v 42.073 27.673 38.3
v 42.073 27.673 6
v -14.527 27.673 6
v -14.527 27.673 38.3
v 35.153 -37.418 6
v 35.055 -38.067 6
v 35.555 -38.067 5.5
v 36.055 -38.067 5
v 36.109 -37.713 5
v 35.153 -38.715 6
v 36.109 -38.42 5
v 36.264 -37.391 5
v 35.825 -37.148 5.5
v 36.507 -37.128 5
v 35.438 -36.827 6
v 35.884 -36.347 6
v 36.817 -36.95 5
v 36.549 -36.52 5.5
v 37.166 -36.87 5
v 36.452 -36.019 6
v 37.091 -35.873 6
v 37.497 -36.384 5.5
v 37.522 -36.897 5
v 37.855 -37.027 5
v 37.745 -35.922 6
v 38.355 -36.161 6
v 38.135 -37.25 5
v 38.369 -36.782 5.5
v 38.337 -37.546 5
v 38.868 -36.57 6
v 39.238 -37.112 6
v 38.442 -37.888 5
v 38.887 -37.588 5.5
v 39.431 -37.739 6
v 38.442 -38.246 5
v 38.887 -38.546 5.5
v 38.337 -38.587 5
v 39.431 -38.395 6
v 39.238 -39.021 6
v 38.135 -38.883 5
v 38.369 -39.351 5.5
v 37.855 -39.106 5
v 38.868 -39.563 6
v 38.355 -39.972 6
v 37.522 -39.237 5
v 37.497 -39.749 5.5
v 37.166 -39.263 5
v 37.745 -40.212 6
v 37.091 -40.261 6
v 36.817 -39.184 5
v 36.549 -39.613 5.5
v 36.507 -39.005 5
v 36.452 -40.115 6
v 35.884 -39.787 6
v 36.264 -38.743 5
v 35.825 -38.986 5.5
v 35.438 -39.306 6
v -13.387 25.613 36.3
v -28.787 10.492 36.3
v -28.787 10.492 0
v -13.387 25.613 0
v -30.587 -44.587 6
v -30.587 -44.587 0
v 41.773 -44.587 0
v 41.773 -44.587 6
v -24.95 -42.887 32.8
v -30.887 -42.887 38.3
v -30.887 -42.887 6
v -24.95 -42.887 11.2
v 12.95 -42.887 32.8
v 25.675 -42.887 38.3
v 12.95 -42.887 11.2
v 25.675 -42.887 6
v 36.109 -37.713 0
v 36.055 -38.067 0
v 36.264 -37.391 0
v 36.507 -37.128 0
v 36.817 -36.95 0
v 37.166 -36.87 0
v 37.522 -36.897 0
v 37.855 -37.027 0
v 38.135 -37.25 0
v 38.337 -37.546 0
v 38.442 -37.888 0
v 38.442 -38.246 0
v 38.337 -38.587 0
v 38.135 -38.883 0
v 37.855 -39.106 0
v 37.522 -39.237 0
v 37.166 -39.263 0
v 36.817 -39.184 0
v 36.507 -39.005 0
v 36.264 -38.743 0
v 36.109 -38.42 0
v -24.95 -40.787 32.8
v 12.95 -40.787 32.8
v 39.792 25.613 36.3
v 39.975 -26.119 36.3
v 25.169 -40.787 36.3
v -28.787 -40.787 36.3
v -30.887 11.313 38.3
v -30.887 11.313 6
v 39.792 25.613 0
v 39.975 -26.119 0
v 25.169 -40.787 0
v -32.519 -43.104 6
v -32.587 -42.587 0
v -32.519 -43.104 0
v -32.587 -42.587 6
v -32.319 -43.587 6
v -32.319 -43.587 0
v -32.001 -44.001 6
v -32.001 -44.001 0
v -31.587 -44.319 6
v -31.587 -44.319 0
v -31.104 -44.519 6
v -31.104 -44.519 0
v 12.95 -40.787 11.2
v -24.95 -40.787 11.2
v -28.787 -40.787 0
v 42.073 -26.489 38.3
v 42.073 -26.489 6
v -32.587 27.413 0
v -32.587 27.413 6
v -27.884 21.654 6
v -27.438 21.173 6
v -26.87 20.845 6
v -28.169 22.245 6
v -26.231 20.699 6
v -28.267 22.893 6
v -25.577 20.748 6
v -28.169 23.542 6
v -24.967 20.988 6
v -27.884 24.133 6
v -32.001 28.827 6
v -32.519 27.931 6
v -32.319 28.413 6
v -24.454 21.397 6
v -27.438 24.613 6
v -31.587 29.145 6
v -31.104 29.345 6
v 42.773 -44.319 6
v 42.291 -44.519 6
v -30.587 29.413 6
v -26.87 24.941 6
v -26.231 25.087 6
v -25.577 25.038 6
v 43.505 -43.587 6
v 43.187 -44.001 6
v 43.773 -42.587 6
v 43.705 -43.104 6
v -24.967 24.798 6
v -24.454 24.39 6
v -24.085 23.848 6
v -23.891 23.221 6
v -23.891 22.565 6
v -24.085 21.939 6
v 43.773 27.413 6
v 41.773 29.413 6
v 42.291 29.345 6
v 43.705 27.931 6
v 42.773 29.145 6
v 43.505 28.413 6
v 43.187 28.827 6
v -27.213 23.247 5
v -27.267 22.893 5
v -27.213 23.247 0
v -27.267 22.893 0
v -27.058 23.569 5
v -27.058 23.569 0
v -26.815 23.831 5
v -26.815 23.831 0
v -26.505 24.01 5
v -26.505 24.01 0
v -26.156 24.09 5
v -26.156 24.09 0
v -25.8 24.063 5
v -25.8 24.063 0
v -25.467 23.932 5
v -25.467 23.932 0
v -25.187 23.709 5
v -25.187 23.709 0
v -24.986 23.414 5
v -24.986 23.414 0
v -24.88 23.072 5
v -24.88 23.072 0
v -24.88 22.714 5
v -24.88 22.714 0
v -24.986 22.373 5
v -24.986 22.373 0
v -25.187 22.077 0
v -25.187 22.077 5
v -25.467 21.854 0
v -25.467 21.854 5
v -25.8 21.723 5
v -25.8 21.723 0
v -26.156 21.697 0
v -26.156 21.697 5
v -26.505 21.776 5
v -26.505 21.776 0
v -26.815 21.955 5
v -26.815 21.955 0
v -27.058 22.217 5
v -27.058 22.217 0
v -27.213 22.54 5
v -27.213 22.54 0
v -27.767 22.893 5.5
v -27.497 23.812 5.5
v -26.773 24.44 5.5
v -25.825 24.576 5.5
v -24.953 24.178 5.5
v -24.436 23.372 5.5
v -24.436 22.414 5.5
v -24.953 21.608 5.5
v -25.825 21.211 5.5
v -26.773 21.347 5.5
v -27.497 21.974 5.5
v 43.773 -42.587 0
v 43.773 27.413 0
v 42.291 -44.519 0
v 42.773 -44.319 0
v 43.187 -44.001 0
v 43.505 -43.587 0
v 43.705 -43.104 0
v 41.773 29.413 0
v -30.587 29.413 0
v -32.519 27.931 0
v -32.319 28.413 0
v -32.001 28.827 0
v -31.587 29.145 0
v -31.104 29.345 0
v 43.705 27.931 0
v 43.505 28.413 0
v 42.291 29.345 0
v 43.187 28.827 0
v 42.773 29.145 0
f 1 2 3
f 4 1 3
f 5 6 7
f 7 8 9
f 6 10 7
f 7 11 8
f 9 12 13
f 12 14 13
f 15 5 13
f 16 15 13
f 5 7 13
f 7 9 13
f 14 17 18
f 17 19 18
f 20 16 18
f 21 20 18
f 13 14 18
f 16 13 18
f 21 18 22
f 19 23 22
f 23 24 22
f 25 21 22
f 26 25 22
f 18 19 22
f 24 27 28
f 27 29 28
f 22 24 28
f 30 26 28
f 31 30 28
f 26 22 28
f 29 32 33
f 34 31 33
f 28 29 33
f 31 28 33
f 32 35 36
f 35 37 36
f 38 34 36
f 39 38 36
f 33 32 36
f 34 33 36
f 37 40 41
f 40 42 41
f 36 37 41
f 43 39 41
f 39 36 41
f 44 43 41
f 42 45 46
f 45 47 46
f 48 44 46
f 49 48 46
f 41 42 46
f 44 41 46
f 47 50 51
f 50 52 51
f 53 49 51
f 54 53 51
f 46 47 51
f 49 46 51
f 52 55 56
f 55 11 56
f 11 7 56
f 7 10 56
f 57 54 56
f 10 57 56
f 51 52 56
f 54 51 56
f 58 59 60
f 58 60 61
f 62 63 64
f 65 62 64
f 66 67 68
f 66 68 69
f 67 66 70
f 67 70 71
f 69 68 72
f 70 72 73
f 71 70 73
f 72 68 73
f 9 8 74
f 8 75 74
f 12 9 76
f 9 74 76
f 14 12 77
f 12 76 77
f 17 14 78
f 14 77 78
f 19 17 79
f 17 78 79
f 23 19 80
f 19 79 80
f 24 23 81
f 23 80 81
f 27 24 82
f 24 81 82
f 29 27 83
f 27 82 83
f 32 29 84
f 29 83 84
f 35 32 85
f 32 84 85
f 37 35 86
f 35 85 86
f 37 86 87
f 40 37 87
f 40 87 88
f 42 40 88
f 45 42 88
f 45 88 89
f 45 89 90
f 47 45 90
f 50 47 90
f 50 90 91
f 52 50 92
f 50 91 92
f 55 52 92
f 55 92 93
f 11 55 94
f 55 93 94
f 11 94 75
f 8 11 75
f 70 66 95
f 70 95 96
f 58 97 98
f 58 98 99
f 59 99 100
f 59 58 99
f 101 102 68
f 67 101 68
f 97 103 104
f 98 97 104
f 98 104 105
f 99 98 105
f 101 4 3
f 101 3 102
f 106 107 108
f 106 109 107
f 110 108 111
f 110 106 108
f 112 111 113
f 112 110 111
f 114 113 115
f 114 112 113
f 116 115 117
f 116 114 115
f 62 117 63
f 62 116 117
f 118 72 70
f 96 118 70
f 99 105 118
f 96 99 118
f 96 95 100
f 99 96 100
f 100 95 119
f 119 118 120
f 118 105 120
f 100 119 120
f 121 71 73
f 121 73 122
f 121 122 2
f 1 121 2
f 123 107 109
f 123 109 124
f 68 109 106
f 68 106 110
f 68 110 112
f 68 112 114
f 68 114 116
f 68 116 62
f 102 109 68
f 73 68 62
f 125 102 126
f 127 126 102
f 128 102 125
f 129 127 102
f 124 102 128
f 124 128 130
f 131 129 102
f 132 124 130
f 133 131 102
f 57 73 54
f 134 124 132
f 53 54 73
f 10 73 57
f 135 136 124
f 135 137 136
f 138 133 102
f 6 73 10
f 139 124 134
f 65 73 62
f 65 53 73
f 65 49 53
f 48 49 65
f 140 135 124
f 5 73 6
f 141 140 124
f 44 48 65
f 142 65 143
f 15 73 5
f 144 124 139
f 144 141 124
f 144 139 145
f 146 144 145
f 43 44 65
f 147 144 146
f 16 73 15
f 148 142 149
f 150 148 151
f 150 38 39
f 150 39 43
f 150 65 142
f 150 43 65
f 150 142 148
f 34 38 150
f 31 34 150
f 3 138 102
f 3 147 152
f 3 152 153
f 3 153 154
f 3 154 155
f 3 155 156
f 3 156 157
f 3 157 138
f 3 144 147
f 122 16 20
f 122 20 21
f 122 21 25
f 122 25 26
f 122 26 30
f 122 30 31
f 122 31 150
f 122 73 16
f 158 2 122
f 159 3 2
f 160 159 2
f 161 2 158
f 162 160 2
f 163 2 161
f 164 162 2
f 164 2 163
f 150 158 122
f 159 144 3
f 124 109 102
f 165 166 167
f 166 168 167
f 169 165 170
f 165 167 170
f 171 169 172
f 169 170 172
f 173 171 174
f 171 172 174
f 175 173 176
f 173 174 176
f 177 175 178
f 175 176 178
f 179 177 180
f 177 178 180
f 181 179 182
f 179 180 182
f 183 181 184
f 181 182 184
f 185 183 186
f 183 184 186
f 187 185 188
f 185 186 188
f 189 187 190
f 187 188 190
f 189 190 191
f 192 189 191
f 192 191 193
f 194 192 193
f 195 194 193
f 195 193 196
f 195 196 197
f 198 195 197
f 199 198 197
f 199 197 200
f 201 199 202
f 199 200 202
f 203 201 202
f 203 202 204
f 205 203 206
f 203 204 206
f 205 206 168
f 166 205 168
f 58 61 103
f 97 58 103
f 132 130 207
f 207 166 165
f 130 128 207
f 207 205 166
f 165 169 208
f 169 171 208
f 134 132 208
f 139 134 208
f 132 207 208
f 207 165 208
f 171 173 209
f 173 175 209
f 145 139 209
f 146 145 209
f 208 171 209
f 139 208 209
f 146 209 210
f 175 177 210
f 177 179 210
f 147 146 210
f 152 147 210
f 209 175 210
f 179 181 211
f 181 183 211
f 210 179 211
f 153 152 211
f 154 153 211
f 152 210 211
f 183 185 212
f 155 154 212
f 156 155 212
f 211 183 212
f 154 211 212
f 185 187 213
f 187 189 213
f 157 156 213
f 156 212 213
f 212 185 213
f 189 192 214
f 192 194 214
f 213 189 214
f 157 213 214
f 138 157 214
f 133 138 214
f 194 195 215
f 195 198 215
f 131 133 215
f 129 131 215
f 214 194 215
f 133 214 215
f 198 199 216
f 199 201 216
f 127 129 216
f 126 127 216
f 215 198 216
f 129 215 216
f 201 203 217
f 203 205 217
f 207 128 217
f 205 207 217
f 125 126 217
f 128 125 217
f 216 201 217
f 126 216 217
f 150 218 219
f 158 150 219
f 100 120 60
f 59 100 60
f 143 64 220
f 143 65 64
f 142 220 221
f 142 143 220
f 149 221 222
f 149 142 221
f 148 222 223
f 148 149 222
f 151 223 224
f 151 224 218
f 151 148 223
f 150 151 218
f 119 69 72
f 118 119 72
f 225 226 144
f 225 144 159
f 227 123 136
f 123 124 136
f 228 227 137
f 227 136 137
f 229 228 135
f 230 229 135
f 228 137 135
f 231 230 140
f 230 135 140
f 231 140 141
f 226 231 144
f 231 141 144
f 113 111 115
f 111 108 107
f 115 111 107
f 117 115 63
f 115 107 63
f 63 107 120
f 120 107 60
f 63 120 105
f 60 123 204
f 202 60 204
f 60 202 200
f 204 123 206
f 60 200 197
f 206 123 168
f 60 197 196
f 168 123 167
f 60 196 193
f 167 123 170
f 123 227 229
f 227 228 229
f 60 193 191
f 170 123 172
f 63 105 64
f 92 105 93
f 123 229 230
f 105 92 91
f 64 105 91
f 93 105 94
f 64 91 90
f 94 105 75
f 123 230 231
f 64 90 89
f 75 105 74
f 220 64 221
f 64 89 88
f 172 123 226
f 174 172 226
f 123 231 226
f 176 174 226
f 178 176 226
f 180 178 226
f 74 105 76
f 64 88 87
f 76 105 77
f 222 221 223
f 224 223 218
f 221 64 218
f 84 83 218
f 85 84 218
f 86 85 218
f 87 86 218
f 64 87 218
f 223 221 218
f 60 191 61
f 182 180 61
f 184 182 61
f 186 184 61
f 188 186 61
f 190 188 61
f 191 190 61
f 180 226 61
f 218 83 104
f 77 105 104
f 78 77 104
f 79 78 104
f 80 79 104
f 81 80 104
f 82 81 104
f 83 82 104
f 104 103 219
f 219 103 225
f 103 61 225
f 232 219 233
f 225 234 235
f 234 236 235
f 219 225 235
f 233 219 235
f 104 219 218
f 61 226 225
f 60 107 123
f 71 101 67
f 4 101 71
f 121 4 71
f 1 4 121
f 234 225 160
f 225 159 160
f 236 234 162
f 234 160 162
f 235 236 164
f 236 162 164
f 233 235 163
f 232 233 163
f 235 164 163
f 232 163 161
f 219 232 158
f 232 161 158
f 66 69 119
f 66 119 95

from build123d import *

# Parameters (mm, degrees)
SKETCH1_W                                            = 76.36
SKETCH1_H                                            = 74
BOSS_EXTRUDE1_DEPTH                                  = 6
FILLET1_R                                            = 2
FILLET2_R                                            = 2
FILLET3_R                                            = 2
FILLET4_R                                            = 2
CSK_FOR_M2_COUNTERSUNK_RAISED_HEAD_SCREW_D           = 2.4
CSK_FOR_M2_COUNTERSUNK_RAISED_HEAD_SCREW_CSINK_D     = 4.4
CSK_FOR_M2_COUNTERSUNK_RAISED_HEAD_SCREW_CSINK_ANGLE = 90
BOSS_EXTRUDE2_DEPTH                                  = 38.3
CUT_EXTRUDE1_DEPTH                                   = 36.3
SKETCH8_W                                            = 37.9
SKETCH8_H                                            = 21.6
CUT_EXTRUDE2_DEPTH                                   = 10


with BuildPart() as part:
    # Sketch1 → Boss-Extrude1 (new body)
    with BuildSketch(Plane.XY):
        with Locations((5.593243707, -7.586756293)):
            Rectangle(SKETCH1_W, SKETCH1_H)
    extrude(amount=BOSS_EXTRUDE1_DEPTH)

    # Fillet1
    fillet1_edges = [part.edges().sort_by_distance(p)[0] for p in [
        (-32.586756293, 29.413243707, 3),
    ]]
    fillet(fillet1_edges, radius=FILLET1_R)

    # Fillet2
    fillet2_edges = [part.edges().sort_by_distance(p)[0] for p in [
        (43.773243707, 29.413243707, 3),
    ]]
    fillet(fillet2_edges, radius=FILLET2_R)

    # Fillet3
    fillet3_edges = [part.edges().sort_by_distance(p)[0] for p in [
        (-32.586756293, -44.586756293, 3),
    ]]
    fillet(fillet3_edges, radius=FILLET3_R)

    # Fillet4
    fillet4_edges = [part.edges().sort_by_distance(p)[0] for p in [
        (43.773243707, -44.586756293, 3),
    ]]
    fillet(fillet4_edges, radius=FILLET4_R)

    # CSK for M2 Countersunk Raised Head Screw1 (through all)
    with Locations(Plane.XY.offset(6)):
        with Locations((-26.066697121, 22.893243707), (37.255416012, -38.066697121)):
            CounterSinkHole(CSK_FOR_M2_COUNTERSUNK_RAISED_HEAD_SCREW_D / 2, CSK_FOR_M2_COUNTERSUNK_RAISED_HEAD_SCREW_CSINK_D / 2, counter_sink_angle=CSK_FOR_M2_COUNTERSUNK_RAISED_HEAD_SCREW_CSINK_ANGLE)

    # Sketch2 → Boss-Extrude2 (add)
    with BuildSketch(Plane.XY):
        Polygon((42.073243707, -26.488928598), (42.073243707, 27.673243707), (-14.526756293, 27.673243707), (-30.886756293, 11.313243707), (-30.886756293, -42.886756293), (25.675416012, -42.886756293), align=None)
    extrude(amount=BOSS_EXTRUDE2_DEPTH)

    # Sketch3 → Cut-Extrude1 (cut)
    with BuildSketch(Plane(origin=(0, 0, 0), x_dir=(-1, 0, 0), z_dir=(0, 0, -1))):
        Polygon((-25.168605052, -40.786756293), (28.786756293, -40.786756293), (28.786756293, 10.491732857), (13.386650304, 25.613243707), (-39.791667004, 25.613243707), (-39.975416012, -26.119028061), align=None)
    extrude(amount=-CUT_EXTRUDE1_DEPTH, mode=Mode.SUBTRACT)

    # Sketch8 → Cut-Extrude2 (cut)
    with BuildSketch(Plane.XZ.offset(42.886756293)):
        with Locations((-6, 22)):
            Rectangle(SKETCH8_W, SKETCH8_H)
    extrude(amount=-CUT_EXTRUDE2_DEPTH, mode=Mode.SUBTRACT)


solid = part.part
